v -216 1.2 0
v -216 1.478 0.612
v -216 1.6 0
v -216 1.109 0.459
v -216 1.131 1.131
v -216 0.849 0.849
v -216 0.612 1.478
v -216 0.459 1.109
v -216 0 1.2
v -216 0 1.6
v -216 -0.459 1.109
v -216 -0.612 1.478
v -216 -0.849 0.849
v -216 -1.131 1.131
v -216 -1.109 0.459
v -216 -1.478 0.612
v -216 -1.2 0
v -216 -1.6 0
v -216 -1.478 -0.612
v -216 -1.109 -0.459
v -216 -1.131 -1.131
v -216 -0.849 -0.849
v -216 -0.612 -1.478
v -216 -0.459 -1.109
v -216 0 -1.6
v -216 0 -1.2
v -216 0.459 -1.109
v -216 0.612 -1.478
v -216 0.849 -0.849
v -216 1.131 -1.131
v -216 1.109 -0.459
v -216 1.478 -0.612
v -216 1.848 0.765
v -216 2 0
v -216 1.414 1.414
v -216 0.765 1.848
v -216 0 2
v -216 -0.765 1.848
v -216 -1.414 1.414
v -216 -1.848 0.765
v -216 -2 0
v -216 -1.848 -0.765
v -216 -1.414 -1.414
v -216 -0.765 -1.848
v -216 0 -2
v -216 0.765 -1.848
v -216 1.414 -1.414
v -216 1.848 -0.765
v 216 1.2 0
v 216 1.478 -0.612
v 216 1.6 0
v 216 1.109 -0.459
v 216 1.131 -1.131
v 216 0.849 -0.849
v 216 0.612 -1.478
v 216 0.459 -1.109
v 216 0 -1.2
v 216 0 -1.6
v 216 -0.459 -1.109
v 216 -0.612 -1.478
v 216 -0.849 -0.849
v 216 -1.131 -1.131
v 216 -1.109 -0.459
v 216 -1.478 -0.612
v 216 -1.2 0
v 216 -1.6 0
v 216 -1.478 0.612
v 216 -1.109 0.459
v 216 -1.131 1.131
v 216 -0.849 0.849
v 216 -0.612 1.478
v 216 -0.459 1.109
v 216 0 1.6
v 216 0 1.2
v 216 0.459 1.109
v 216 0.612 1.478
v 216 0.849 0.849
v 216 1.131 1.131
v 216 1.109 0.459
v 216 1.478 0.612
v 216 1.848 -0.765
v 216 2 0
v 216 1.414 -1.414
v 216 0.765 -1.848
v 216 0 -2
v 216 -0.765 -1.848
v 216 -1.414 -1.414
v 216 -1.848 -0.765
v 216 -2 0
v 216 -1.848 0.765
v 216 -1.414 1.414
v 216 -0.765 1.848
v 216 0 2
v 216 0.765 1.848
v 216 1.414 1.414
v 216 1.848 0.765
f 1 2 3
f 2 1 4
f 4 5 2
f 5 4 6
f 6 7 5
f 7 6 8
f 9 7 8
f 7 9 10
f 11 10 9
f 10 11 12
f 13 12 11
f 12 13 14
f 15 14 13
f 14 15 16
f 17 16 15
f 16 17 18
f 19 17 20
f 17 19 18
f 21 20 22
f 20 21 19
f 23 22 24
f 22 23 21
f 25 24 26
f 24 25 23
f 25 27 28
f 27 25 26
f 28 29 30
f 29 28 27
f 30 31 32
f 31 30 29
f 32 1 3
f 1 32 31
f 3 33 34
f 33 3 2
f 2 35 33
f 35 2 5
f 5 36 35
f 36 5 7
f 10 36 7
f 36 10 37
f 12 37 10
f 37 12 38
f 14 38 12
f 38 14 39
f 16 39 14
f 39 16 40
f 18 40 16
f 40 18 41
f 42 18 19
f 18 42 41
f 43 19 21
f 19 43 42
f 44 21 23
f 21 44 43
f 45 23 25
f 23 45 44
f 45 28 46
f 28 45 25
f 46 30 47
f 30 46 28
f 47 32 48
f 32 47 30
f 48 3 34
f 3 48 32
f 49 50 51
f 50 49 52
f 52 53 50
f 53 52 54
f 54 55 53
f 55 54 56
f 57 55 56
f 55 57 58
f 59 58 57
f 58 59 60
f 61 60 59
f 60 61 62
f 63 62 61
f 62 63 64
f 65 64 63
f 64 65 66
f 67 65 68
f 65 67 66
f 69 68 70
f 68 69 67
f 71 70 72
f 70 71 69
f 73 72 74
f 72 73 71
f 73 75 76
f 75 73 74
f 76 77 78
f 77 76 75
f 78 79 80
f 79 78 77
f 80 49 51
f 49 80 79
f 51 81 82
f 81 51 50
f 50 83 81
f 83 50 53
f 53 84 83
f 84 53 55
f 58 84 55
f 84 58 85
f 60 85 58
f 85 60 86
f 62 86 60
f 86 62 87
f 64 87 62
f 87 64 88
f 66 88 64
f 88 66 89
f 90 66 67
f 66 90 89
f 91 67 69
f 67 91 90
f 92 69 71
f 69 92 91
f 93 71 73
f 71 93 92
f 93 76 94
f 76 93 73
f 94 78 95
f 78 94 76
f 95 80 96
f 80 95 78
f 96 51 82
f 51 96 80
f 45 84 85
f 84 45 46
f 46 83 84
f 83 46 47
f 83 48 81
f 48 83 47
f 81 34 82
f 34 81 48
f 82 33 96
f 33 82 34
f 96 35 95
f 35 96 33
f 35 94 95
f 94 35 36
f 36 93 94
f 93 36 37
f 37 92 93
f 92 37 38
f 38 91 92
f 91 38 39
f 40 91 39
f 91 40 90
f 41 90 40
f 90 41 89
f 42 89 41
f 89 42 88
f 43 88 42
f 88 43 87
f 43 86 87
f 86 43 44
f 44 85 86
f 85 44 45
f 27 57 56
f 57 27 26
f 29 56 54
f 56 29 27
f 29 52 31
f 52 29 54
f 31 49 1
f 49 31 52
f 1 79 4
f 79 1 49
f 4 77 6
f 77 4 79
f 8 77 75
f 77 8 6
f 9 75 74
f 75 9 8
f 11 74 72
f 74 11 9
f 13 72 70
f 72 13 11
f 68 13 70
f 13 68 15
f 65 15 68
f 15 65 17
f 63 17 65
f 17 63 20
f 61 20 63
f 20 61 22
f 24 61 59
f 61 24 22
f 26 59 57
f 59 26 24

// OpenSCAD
// file: ../p/4-4cyli.scad
use <../lib.scad>
function ldraw_lib__4_4cyli() = [
// 0 Cylinder 1.0
// 0 Name: 4-4cyli.dat
// 0 Author: James Jessiman
// 0 !LDRAW_ORG Primitive UPDATE 2005-01
// 0 !LICENSE Licensed under CC BY 2.0 and CC BY 4.0 : see CAreadme.txt
// 
// 0 BFC CERTIFY CCW
  [0,"BFC","CERTIFY"],
  [0,"BFC","CCW"],
// 
// 0 !HISTORY 1998-12-15 [PTadmin] Official Update 1998-10
// 0 !HISTORY 2002-03-23 [sbliss] Added BFC statement; merged headers from files in distributions LDraw 0.27 and Complete.
// 0 !HISTORY 2002-04-25 [PTadmin] Official Update 2002-02
// 0 !HISTORY 2004-12-14 [guyvivan] BFC CCW
// 0 !HISTORY 2005-12-28 [PTadmin] Official Update 2005-01
// 0 !HISTORY 2007-06-24 [PTadmin] Header formatted for Contributor Agreement
// 0 !HISTORY 2008-07-01 [PTadmin] Official Update 2008-01
// 
// 
// 4 16 1 1 0 0.9239 1 0.3827 0.9239 0 0.3827 1 0 0
  [4,16,1,1,0,0.9239,1,0.3827,0.9239,0,0.3827,1,0,0],
// 5 24 1 0 0 1 1 0 0.9239 0 0.3827 0.9239 0 -0.3827
  [5,24,1,0,0,1,1,0,0.9239,0,0.3827,0.9239,0,-0.3827],
// 4 16 0.9239 1 0.3827 0.7071 1 0.7071 0.7071 0 0.7071 0.9239 0 0.3827
  [4,16,0.9239,1,0.3827,0.7071,1,0.7071,0.7071,0,0.7071,0.9239,0,0.3827],
// 5 24 0.9239 0 0.3827 0.9239 1 0.3827 0.7071 0 0.7071 1 0 0
  [5,24,0.9239,0,0.3827,0.9239,1,0.3827,0.7071,0,0.7071,1,0,0],
// 4 16 0.7071 1 0.7071 0.3827 1 0.9239 0.3827 0 0.9239 0.7071 0 0.7071
  [4,16,0.7071,1,0.7071,0.3827,1,0.9239,0.3827,0,0.9239,0.7071,0,0.7071],
// 5 24 0.7071 0 0.7071 0.7071 1 0.7071 0.3827 0 0.9239 0.9239 0 0.3827
  [5,24,0.7071,0,0.7071,0.7071,1,0.7071,0.3827,0,0.9239,0.9239,0,0.3827],
// 4 16 0.3827 1 0.9239 0 1 1 0 0 1 0.3827 0 0.9239
  [4,16,0.3827,1,0.9239,0,1,1,0,0,1,0.3827,0,0.9239],
// 5 24 0.3827 0 0.9239 0.3827 1 0.9239 0 0 1 0.7071 0 0.7071
  [5,24,0.3827,0,0.9239,0.3827,1,0.9239,0,0,1,0.7071,0,0.7071],
// 4 16 0 1 1 -0.3827 1 0.9239 -0.3827 0 0.9239 0 0 1
  [4,16,0,1,1,-0.3827,1,0.9239,-0.3827,0,0.9239,0,0,1],
// 5 24 0 0 1 0 1 1 -0.3827 0 0.9239 0.3827 0 0.9239
  [5,24,0,0,1,0,1,1,-0.3827,0,0.9239,0.3827,0,0.9239],
// 4 16 -0.3827 1 0.9239 -0.7071 1 0.7071 -0.7071 0 0.7071 -0.3827 0 0.9239
  [4,16,-0.3827,1,0.9239,-0.7071,1,0.7071,-0.7071,0,0.7071,-0.3827,0,0.9239],
// 5 24 -0.3827 0 0.9239 -0.3827 1 0.9239 -0.7071 0 0.7071 0 0 1
  [5,24,-0.3827,0,0.9239,-0.3827,1,0.9239,-0.7071,0,0.7071,0,0,1],
// 4 16 -0.7071 1 0.7071 -0.9239 1 0.3827 -0.9239 0 0.3827 -0.7071 0 0.7071
  [4,16,-0.7071,1,0.7071,-0.9239,1,0.3827,-0.9239,0,0.3827,-0.7071,0,0.7071],
// 5 24 -0.7071 0 0.7071 -0.7071 1 0.7071 -0.9239 0 0.3827 -0.3827 0 0.9239
  [5,24,-0.7071,0,0.7071,-0.7071,1,0.7071,-0.9239,0,0.3827,-0.3827,0,0.9239],
// 4 16 -0.9239 1 0.3827 -1 1 0 -1 0 0 -0.9239 0 0.3827
  [4,16,-0.9239,1,0.3827,-1,1,0,-1,0,0,-0.9239,0,0.3827],
// 5 24 -0.9239 0 0.3827 -0.9239 1 0.3827 -1 0 0 -0.7071 0 0.7071
  [5,24,-0.9239,0,0.3827,-0.9239,1,0.3827,-1,0,0,-0.7071,0,0.7071],
// 4 16 -1 1 0 -0.9239 1 -0.3827 -0.9239 0 -0.3827 -1 0 0
  [4,16,-1,1,0,-0.9239,1,-0.3827,-0.9239,0,-0.3827,-1,0,0],
// 5 24 -1 0 0 -1 1 0 -0.9239 0 -0.3827 -0.9239 0 0.3827
  [5,24,-1,0,0,-1,1,0,-0.9239,0,-0.3827,-0.9239,0,0.3827],
// 4 16 -0.9239 1 -0.3827 -0.7071 1 -0.7071 -0.7071 0 -0.7071 -0.9239 0 -0.3827
  [4,16,-0.9239,1,-0.3827,-0.7071,1,-0.7071,-0.7071,0,-0.7071,-0.9239,0,-0.3827],
// 5 24 -0.9239 0 -0.3827 -0.9239 1 -0.3827 -0.7071 0 -0.7071 -1 0 0
  [5,24,-0.9239,0,-0.3827,-0.9239,1,-0.3827,-0.7071,0,-0.7071,-1,0,0],
// 4 16 -0.7071 1 -0.7071 -0.3827 1 -0.9239 -0.3827 0 -0.9239 -0.7071 0 -0.7071
  [4,16,-0.7071,1,-0.7071,-0.3827,1,-0.9239,-0.3827,0,-0.9239,-0.7071,0,-0.7071],
// 5 24 -0.7071 0 -0.7071 -0.7071 1 -0.7071 -0.3827 0 -0.9239 -0.9239 0 -0.3827
  [5,24,-0.7071,0,-0.7071,-0.7071,1,-0.7071,-0.3827,0,-0.9239,-0.9239,0,-0.3827],
// 4 16 -0.3827 1 -0.9239 0 1 -1 0 0 -1 -0.3827 0 -0.9239
  [4,16,-0.3827,1,-0.9239,0,1,-1,0,0,-1,-0.3827,0,-0.9239],
// 5 24 -0.3827 0 -0.9239 -0.3827 1 -0.9239 0 0 -1 -0.7071 0 -0.7071
  [5,24,-0.3827,0,-0.9239,-0.3827,1,-0.9239,0,0,-1,-0.7071,0,-0.7071],
// 4 16 0 1 -1 0.3827 1 -0.9239 0.3827 0 -0.9239 0 0 -1
  [4,16,0,1,-1,0.3827,1,-0.9239,0.3827,0,-0.9239,0,0,-1],
// 5 24 0 0 -1 0 1 -1 0.3827 0 -0.9239 -0.3827 0 -0.9239
  [5,24,0,0,-1,0,1,-1,0.3827,0,-0.9239,-0.3827,0,-0.9239],
// 4 16 0.3827 1 -0.9239 0.7071 1 -0.7071 0.7071 0 -0.7071 0.3827 0 -0.9239
  [4,16,0.3827,1,-0.9239,0.7071,1,-0.7071,0.7071,0,-0.7071,0.3827,0,-0.9239],
// 5 24 0.3827 0 -0.9239 0.3827 1 -0.9239 0.7071 0 -0.7071 0 0 -1
  [5,24,0.3827,0,-0.9239,0.3827,1,-0.9239,0.7071,0,-0.7071,0,0,-1],
// 4 16 0.7071 1 -0.7071 0.9239 1 -0.3827 0.9239 0 -0.3827 0.7071 0 -0.7071
  [4,16,0.7071,1,-0.7071,0.9239,1,-0.3827,0.9239,0,-0.3827,0.7071,0,-0.7071],
// 5 24 0.7071 0 -0.7071 0.7071 1 -0.7071 0.9239 0 -0.3827 0.3827 0 -0.9239
  [5,24,0.7071,0,-0.7071,0.7071,1,-0.7071,0.9239,0,-0.3827,0.3827,0,-0.9239],
// 4 16 0.9239 1 -0.3827 1 1 0 1 0 0 0.9239 0 -0.3827
  [4,16,0.9239,1,-0.3827,1,1,0,1,0,0,0.9239,0,-0.3827],
// 5 24 0.9239 0 -0.3827 0.9239 1 -0.3827 1 0 0 0.7071 0 -0.7071
  [5,24,0.9239,0,-0.3827,0.9239,1,-0.3827,1,0,0,0.7071,0,-0.7071],
// 0
];
module ldraw_lib__4_4cyli(step=0, col=false, unit=2/5, alt=false, line=0.2, solid=!$preview)
    makepoly(ldraw_lib__4_4cyli(), step=step, col=col, unit=unit, alt=alt, line=line, solid=solid);
ldraw_lib__4_4cyli(line=0.2);
// file: ../p/4-4ring4.scad
use <../lib.scad>
function ldraw_lib__4_4ring4() = [
// 0 Ring  4 x 1.0
// 0 Name: 4-4ring4.dat
// 0 Author: James Jessiman
// 0 !LDRAW_ORG Primitive UPDATE 2009-01
// 0 !LICENSE Licensed under CC BY 2.0 and CC BY 4.0 : see CAreadme.txt
// 
// 0 BFC CERTIFY CCW
  [0,"BFC","CERTIFY"],
  [0,"BFC","CCW"],
// 
// 0 !HISTORY 1998-12-15 [PTadmin] Official Update 1998-10
// 0 !HISTORY 2002-04-08 [BrickCaster] Modified for BFC compliance
// 0 !HISTORY 2002-04-25 [PTadmin] Official Update 2002-02
// 0 !HISTORY 2007-06-24 [PTadmin] Header formatted for Contributor Agreement
// 0 !HISTORY 2008-07-01 [PTadmin] Official Update 2008-01
// 0 !HISTORY 2008-08-26 [cwdee] Switch polygon winding and rename
// 0 !HISTORY 2009-05-02 [PTadmin] Official Update 2009-01
// 
// 
// 4 16 -1.9135 0 4.6195 -1.5308 0 3.6956 0 0 4 0 0 5
  [4,16,-1.9135,0,4.6195,-1.5308,0,3.6956,0,0,4,0,0,5],
// 4 16 -3.5355 0 3.5355 -2.8284 0 2.8284 -1.5308 0 3.6956 -1.9135 0 4.6195
  [4,16,-3.5355,0,3.5355,-2.8284,0,2.8284,-1.5308,0,3.6956,-1.9135,0,4.6195],
// 4 16 -4.6195 0 1.9135 -3.6956 0 1.5308 -2.8284 0 2.8284 -3.5355 0 3.5355
  [4,16,-4.6195,0,1.9135,-3.6956,0,1.5308,-2.8284,0,2.8284,-3.5355,0,3.5355],
// 4 16 -5 0 0 -4 0 0 -3.6956 0 1.5308 -4.6195 0 1.9135
  [4,16,-5,0,0,-4,0,0,-3.6956,0,1.5308,-4.6195,0,1.9135],
// 4 16 -4.6195 0 -1.9135 -3.6956 0 -1.5308 -4 0 0 -5 0 0
  [4,16,-4.6195,0,-1.9135,-3.6956,0,-1.5308,-4,0,0,-5,0,0],
// 4 16 -3.5355 0 -3.5355 -2.8284 0 -2.8284 -3.6956 0 -1.5308 -4.6195 0 -1.9135
  [4,16,-3.5355,0,-3.5355,-2.8284,0,-2.8284,-3.6956,0,-1.5308,-4.6195,0,-1.9135],
// 4 16 -1.9135 0 -4.6195 -1.5308 0 -3.6956 -2.8284 0 -2.8284 -3.5355 0 -3.5355
  [4,16,-1.9135,0,-4.6195,-1.5308,0,-3.6956,-2.8284,0,-2.8284,-3.5355,0,-3.5355],
// 4 16 0 0 -5 0 0 -4 -1.5308 0 -3.6956 -1.9135 0 -4.6195
  [4,16,0,0,-5,0,0,-4,-1.5308,0,-3.6956,-1.9135,0,-4.6195],
// 4 16 1.9135 0 -4.6195 1.5308 0 -3.6956 0 0 -4 0 0 -5
  [4,16,1.9135,0,-4.6195,1.5308,0,-3.6956,0,0,-4,0,0,-5],
// 4 16 3.5355 0 -3.5355 2.8284 0 -2.8284 1.5308 0 -3.6956 1.9135 0 -4.6195
  [4,16,3.5355,0,-3.5355,2.8284,0,-2.8284,1.5308,0,-3.6956,1.9135,0,-4.6195],
// 4 16 4.6195 0 -1.9135 3.6956 0 -1.5308 2.8284 0 -2.8284 3.5355 0 -3.5355
  [4,16,4.6195,0,-1.9135,3.6956,0,-1.5308,2.8284,0,-2.8284,3.5355,0,-3.5355],
// 4 16 5 0 0 4 0 0 3.6956 0 -1.5308 4.6195 0 -1.9135
  [4,16,5,0,0,4,0,0,3.6956,0,-1.5308,4.6195,0,-1.9135],
// 4 16 4.6195 0 1.9135 3.6956 0 1.5308 4 0 0 5 0 0
  [4,16,4.6195,0,1.9135,3.6956,0,1.5308,4,0,0,5,0,0],
// 4 16 3.5355 0 3.5355 2.8284 0 2.8284 3.6956 0 1.5308 4.6195 0 1.9135
  [4,16,3.5355,0,3.5355,2.8284,0,2.8284,3.6956,0,1.5308,4.6195,0,1.9135],
// 4 16 1.9135 0 4.6195 1.5308 0 3.6956 2.8284 0 2.8284 3.5355 0 3.5355
  [4,16,1.9135,0,4.6195,1.5308,0,3.6956,2.8284,0,2.8284,3.5355,0,3.5355],
// 4 16 0 0 5 0 0 4 1.5308 0 3.6956 1.9135 0 4.6195
  [4,16,0,0,5,0,0,4,1.5308,0,3.6956,1.9135,0,4.6195],
// 0
];
module ldraw_lib__4_4ring4(step=0, col=false, unit=2/5, alt=false, line=0.2, solid=!$preview)
    makepoly(ldraw_lib__4_4ring4(), step=step, col=col, unit=unit, alt=alt, line=line, solid=solid);
ldraw_lib__4_4ring4(line=0.2);
// file: ../p/4-4ring3.scad
use <../lib.scad>
function ldraw_lib__4_4ring3() = [
// 0 Ring  3 x 1.0
// 0 Name: 4-4ring3.dat
// 0 Author: James Jessiman
// 0 !LDRAW_ORG Primitive UPDATE 2009-01
// 0 !LICENSE Licensed under CC BY 2.0 and CC BY 4.0 : see CAreadme.txt
// 
// 0 BFC CERTIFY CCW
  [0,"BFC","CERTIFY"],
  [0,"BFC","CCW"],
// 
// 0 !HISTORY 1998-12-15 [PTadmin] Official Update 1998-10
// 0 !HISTORY 2002-04-05 [hafhead] Added BFC statement
// 0 !HISTORY 2002-04-25 [PTadmin] Official Update 2002-02
// 0 !HISTORY 2007-06-24 [PTadmin] Header formatted for Contributor Agreement
// 0 !HISTORY 2008-07-01 [PTadmin] Official Update 2008-01
// 0 !HISTORY 2008-08-26 [cwdee] Switch polygon winding and rename
// 0 !HISTORY 2009-05-02 [PTadmin] Official Update 2009-01
// 
// 
// 4 16 -1.5308 0 3.6956 -1.1481 0 2.7717 0 0 3 0 0 4
  [4,16,-1.5308,0,3.6956,-1.1481,0,2.7717,0,0,3,0,0,4],
// 4 16 -2.8284 0 2.8284 -2.1213 0 2.1213 -1.1481 0 2.7717 -1.5308 0 3.6956
  [4,16,-2.8284,0,2.8284,-2.1213,0,2.1213,-1.1481,0,2.7717,-1.5308,0,3.6956],
// 4 16 -3.6956 0 1.5308 -2.7717 0 1.1481 -2.1213 0 2.1213 -2.8284 0 2.8284
  [4,16,-3.6956,0,1.5308,-2.7717,0,1.1481,-2.1213,0,2.1213,-2.8284,0,2.8284],
// 4 16 -4 0 0 -3 0 0 -2.7717 0 1.1481 -3.6956 0 1.5308
  [4,16,-4,0,0,-3,0,0,-2.7717,0,1.1481,-3.6956,0,1.5308],
// 4 16 -3.6956 0 -1.5308 -2.7717 0 -1.1481 -3 0 0 -4 0 0
  [4,16,-3.6956,0,-1.5308,-2.7717,0,-1.1481,-3,0,0,-4,0,0],
// 4 16 -2.8284 0 -2.8284 -2.1213 0 -2.1213 -2.7717 0 -1.1481 -3.6956 0 -1.5308
  [4,16,-2.8284,0,-2.8284,-2.1213,0,-2.1213,-2.7717,0,-1.1481,-3.6956,0,-1.5308],
// 4 16 -1.5308 0 -3.6956 -1.1481 0 -2.7717 -2.1213 0 -2.1213 -2.8284 0 -2.8284
  [4,16,-1.5308,0,-3.6956,-1.1481,0,-2.7717,-2.1213,0,-2.1213,-2.8284,0,-2.8284],
// 4 16 0 0 -4 0 0 -3 -1.1481 0 -2.7717 -1.5308 0 -3.6956
  [4,16,0,0,-4,0,0,-3,-1.1481,0,-2.7717,-1.5308,0,-3.6956],
// 4 16 1.5308 0 -3.6956 1.1481 0 -2.7717 0 0 -3 0 0 -4
  [4,16,1.5308,0,-3.6956,1.1481,0,-2.7717,0,0,-3,0,0,-4],
// 4 16 2.8284 0 -2.8284 2.1213 0 -2.1213 1.1481 0 -2.7717 1.5308 0 -3.6956
  [4,16,2.8284,0,-2.8284,2.1213,0,-2.1213,1.1481,0,-2.7717,1.5308,0,-3.6956],
// 4 16 3.6956 0 -1.5308 2.7717 0 -1.1481 2.1213 0 -2.1213 2.8284 0 -2.8284
  [4,16,3.6956,0,-1.5308,2.7717,0,-1.1481,2.1213,0,-2.1213,2.8284,0,-2.8284],
// 4 16 4 0 0 3 0 0 2.7717 0 -1.1481 3.6956 0 -1.5308
  [4,16,4,0,0,3,0,0,2.7717,0,-1.1481,3.6956,0,-1.5308],
// 4 16 3.6956 0 1.5308 2.7717 0 1.1481 3 0 0 4 0 0
  [4,16,3.6956,0,1.5308,2.7717,0,1.1481,3,0,0,4,0,0],
// 4 16 2.8284 0 2.8284 2.1213 0 2.1213 2.7717 0 1.1481 3.6956 0 1.5308
  [4,16,2.8284,0,2.8284,2.1213,0,2.1213,2.7717,0,1.1481,3.6956,0,1.5308],
// 4 16 1.5308 0 3.6956 1.1481 0 2.7717 2.1213 0 2.1213 2.8284 0 2.8284
  [4,16,1.5308,0,3.6956,1.1481,0,2.7717,2.1213,0,2.1213,2.8284,0,2.8284],
// 4 16 0 0 4 0 0 3 1.1481 0 2.7717 1.5308 0 3.6956
  [4,16,0,0,4,0,0,3,1.1481,0,2.7717,1.5308,0,3.6956],
// 0
];
module ldraw_lib__4_4ring3(step=0, col=false, unit=2/5, alt=false, line=0.2, solid=!$preview)
    makepoly(ldraw_lib__4_4ring3(), step=step, col=col, unit=unit, alt=alt, line=line, solid=solid);
ldraw_lib__4_4ring3(line=0.2);
// file: ../p/4-4edge.scad
use <../lib.scad>
function ldraw_lib__4_4edge() = [
// 0 Circle 1.0
// 0 Name: 4-4edge.dat
// 0 Author: James Jessiman
// 0 !LDRAW_ORG Primitive UPDATE 2017-01
// 0 !LICENSE Licensed under CC BY 2.0 and CC BY 4.0 : see CAreadme.txt
// 
// 0 BFC CERTIFY CCW
  [0,"BFC","CERTIFY"],
  [0,"BFC","CCW"],
// 
// 0 !HISTORY 1998-12-15 [PTadmin] Official Update 1998-10
// 0 !HISTORY 2005-12-28 [PTadmin] Official Update 2005-01
// 0 !HISTORY 2007-06-24 [PTadmin] Header formatted for Contributor Agreement
// 0 !HISTORY 2008-07-01 [PTadmin] Official Update 2008-01
// 0 !HISTORY 2017-01-15 [Steffen] BFCed
// 0 !HISTORY 2017-12-30 [PTadmin] Official Update 2017-01
// 
// 
// 2 24 1 0 0 0.9239 0 0.3827
  [2,24,1,0,0,0.9239,0,0.3827],
// 2 24 0.9239 0 0.3827 0.7071 0 0.7071
  [2,24,0.9239,0,0.3827,0.7071,0,0.7071],
// 2 24 0.7071 0 0.7071 0.3827 0 0.9239
  [2,24,0.7071,0,0.7071,0.3827,0,0.9239],
// 2 24 0.3827 0 0.9239 0 0 1
  [2,24,0.3827,0,0.9239,0,0,1],
// 2 24 0 0 1 -0.3827 0 0.9239
  [2,24,0,0,1,-0.3827,0,0.9239],
// 2 24 -0.3827 0 0.9239 -0.7071 0 0.7071
  [2,24,-0.3827,0,0.9239,-0.7071,0,0.7071],
// 2 24 -0.7071 0 0.7071 -0.9239 0 0.3827
  [2,24,-0.7071,0,0.7071,-0.9239,0,0.3827],
// 2 24 -0.9239 0 0.3827 -1 0 -0
  [2,24,-0.9239,0,0.3827,-1,0,-0],
// 2 24 -1 0 -0 -0.9239 0 -0.3827
  [2,24,-1,0,-0,-0.9239,0,-0.3827],
// 2 24 -0.9239 0 -0.3827 -0.7071 0 -0.7071
  [2,24,-0.9239,0,-0.3827,-0.7071,0,-0.7071],
// 2 24 -0.7071 0 -0.7071 -0.3827 0 -0.9239
  [2,24,-0.7071,0,-0.7071,-0.3827,0,-0.9239],
// 2 24 -0.3827 0 -0.9239 0 0 -1
  [2,24,-0.3827,0,-0.9239,0,0,-1],
// 2 24 0 0 -1 0.3827 0 -0.9239
  [2,24,0,0,-1,0.3827,0,-0.9239],
// 2 24 0.3827 0 -0.9239 0.7071 0 -0.7071
  [2,24,0.3827,0,-0.9239,0.7071,0,-0.7071],
// 2 24 0.7071 0 -0.7071 0.9239 0 -0.3827
  [2,24,0.7071,0,-0.7071,0.9239,0,-0.3827],
// 2 24 0.9239 0 -0.3827 1 0 0
  [2,24,0.9239,0,-0.3827,1,0,0],
];
module ldraw_lib__4_4edge(step=0, col=false, unit=2/5, alt=false, line=0.2, solid=!$preview)
    makepoly(ldraw_lib__4_4edge(), step=step, col=col, unit=unit, alt=alt, line=line, solid=solid);
ldraw_lib__4_4edge(line=0.2);
// file: 71533k03.scad
use <../lib.scad>
use <../p/4-4cyli.scad>
function ldraw_lib__71533k03() = [
// 0 ~Technic Pneumatic Tube Segment
// 0 Name: 71533k03.dat
// 0 Author: Jaco van der Molen [Jaco]
// 0 !LDRAW_ORG Part Flexible_Section UPDATE 2020-01
// 0 !LICENSE Licensed under CC BY 2.0 and CC BY 4.0 : see CAreadme.txt
// 
// 0 BFC CERTIFY CW
  [0,"BFC","CERTIFY"],
  [0,"BFC","CW"],
// 
// 0 !HISTORY 2003-11-30 [Steffen] BFCed
// 0 !HISTORY 2009-12-29 [PTadmin] Official Update 2009-03
// 0 !HISTORY 2020-06-27 [PTadmin] Renamed from 166
// 0 !HISTORY 2020-06-28 [PTadmin] Official Update 2020-01
// 
// 
// 1 16 0 0 0 5 0 0 0 1 0 0 0 5 4-4cyli.dat
  [1,16,0,0,0,5,0,0,0,1,0,0,0,5, ldraw_lib__4_4cyli()],
// 0 BFC INVERTNEXT
  [0,"BFC","INVERTNEXT"],
// 1 16 0 0 0 3 0 0 0 1 0 0 0 3 4-4cyli.dat
  [1,16,0,0,0,3,0,0,0,1,0,0,0,3, ldraw_lib__4_4cyli()],
// 0
];
module ldraw_lib__71533k03(step=0, col=false, unit=2/5, alt=false, line=0.2, solid=!$preview)
    makepoly(ldraw_lib__71533k03(), step=step, col=col, unit=unit, alt=alt, line=line, solid=solid);
ldraw_lib__71533k03(line=0.2);
// file: 71533k02.scad
use <../lib.scad>
use <../p/4-4edge.scad>
use <../p/4-4ring3.scad>
use <../p/4-4ring4.scad>
function ldraw_lib__71533k02() = [
// 0 ~Technic Pneumatic Tube End (Non-Bulged)
// 0 Name: 71533k02.dat
// 0 Author: Steffen [Steffen]
// 0 !LDRAW_ORG Part Flexible_Section UPDATE 2020-01
// 0 !LICENSE Licensed under CC BY 2.0 and CC BY 4.0 : see CAreadme.txt
// 
// 0 BFC CERTIFY CCW
  [0,"BFC","CERTIFY"],
  [0,"BFC","CCW"],
// 
// 0 !HISTORY 2020-06-28 [PTadmin] Official Update 2020-01
// 
// 
// 0 // This file goes together with 71533k01.dat and 71533k03.dat.
// 0 // Those 3 files can be used to create Technic Pneumatic Tubes
// 0 // with either bulged or non-bulged ends.
// 
// 1 16 0 0 0 1 0 0 0 1 0 0 0 1 4-4ring3.dat
  [1,16,0,0,0,1,0,0,0,1,0,0,0,1, ldraw_lib__4_4ring3()],
// 1 16 0 0 0 1 0 0 0 1 0 0 0 1 4-4ring4.dat
  [1,16,0,0,0,1,0,0,0,1,0,0,0,1, ldraw_lib__4_4ring4()],
// 1 16 0 0 0 3 0 0 0 3 0 0 0 3 4-4edge.dat
  [1,16,0,0,0,3,0,0,0,3,0,0,0,3, ldraw_lib__4_4edge()],
// 1 16 0 0 0 5 0 0 0 5 0 0 0 5 4-4edge.dat
  [1,16,0,0,0,5,0,0,0,5,0,0,0,5, ldraw_lib__4_4edge()],
];
module ldraw_lib__71533k02(step=0, col=false, unit=2/5, alt=false, line=0.2, solid=!$preview)
    makepoly(ldraw_lib__71533k02(), step=step, col=col, unit=unit, alt=alt, line=line, solid=solid);
ldraw_lib__71533k02(line=0.2);
// main file
use <../lib.scad>
use <71533k02.scad>
use <71533k03.scad>
function ldraw_lib__96890_f1() = [
// 0 Technic Pneumatic Tube 54L
// 0 Name: 96890-f1.dat
// 0 Author: Philippe Hurbain [Philo]
// 0 !LDRAW_ORG Part UPDATE 2020-02
// 0 !LICENSE Licensed under CC BY 2.0 and CC BY 4.0 : see CAreadme.txt
// 
// 0 BFC CERTIFY CCW
  [0,"BFC","CERTIFY"],
  [0,"BFC","CCW"],
// 
// 0 !KEYWORDS 432 mm
// 
// 0 !HISTORY 2020-09-05 [PTadmin] Official Update 2020-02
// 
// 
// 1 16 -540 0 0 0 1 0 1 0 0 0 0 1 71533k02.dat
  [1,16,-540,0,0,0,1,0,1,0,0,0,0,1, ldraw_lib__71533k02()],
// 1 16 540 0 0 0 -1 0 -1 0 0 0 0 1 71533k02.dat
  [1,16,540,0,0,0,-1,0,-1,0,0,0,0,1, ldraw_lib__71533k02()],
// 1 16 -540 0 0 0 1080 0 1 0 0 0 0 1 71533k03.dat
  [1,16,-540,0,0,0,1080,0,1,0,0,0,0,1, ldraw_lib__71533k03()],
];
module ldraw_lib__96890_f1(step=0, col=false, unit=2/5, alt=false, line=0.2, solid=!$preview)
    makepoly(ldraw_lib__96890_f1(), step=step, col=col, unit=unit, alt=alt, line=line, solid=solid);
ldraw_lib__96890_f1(line=0.2);
